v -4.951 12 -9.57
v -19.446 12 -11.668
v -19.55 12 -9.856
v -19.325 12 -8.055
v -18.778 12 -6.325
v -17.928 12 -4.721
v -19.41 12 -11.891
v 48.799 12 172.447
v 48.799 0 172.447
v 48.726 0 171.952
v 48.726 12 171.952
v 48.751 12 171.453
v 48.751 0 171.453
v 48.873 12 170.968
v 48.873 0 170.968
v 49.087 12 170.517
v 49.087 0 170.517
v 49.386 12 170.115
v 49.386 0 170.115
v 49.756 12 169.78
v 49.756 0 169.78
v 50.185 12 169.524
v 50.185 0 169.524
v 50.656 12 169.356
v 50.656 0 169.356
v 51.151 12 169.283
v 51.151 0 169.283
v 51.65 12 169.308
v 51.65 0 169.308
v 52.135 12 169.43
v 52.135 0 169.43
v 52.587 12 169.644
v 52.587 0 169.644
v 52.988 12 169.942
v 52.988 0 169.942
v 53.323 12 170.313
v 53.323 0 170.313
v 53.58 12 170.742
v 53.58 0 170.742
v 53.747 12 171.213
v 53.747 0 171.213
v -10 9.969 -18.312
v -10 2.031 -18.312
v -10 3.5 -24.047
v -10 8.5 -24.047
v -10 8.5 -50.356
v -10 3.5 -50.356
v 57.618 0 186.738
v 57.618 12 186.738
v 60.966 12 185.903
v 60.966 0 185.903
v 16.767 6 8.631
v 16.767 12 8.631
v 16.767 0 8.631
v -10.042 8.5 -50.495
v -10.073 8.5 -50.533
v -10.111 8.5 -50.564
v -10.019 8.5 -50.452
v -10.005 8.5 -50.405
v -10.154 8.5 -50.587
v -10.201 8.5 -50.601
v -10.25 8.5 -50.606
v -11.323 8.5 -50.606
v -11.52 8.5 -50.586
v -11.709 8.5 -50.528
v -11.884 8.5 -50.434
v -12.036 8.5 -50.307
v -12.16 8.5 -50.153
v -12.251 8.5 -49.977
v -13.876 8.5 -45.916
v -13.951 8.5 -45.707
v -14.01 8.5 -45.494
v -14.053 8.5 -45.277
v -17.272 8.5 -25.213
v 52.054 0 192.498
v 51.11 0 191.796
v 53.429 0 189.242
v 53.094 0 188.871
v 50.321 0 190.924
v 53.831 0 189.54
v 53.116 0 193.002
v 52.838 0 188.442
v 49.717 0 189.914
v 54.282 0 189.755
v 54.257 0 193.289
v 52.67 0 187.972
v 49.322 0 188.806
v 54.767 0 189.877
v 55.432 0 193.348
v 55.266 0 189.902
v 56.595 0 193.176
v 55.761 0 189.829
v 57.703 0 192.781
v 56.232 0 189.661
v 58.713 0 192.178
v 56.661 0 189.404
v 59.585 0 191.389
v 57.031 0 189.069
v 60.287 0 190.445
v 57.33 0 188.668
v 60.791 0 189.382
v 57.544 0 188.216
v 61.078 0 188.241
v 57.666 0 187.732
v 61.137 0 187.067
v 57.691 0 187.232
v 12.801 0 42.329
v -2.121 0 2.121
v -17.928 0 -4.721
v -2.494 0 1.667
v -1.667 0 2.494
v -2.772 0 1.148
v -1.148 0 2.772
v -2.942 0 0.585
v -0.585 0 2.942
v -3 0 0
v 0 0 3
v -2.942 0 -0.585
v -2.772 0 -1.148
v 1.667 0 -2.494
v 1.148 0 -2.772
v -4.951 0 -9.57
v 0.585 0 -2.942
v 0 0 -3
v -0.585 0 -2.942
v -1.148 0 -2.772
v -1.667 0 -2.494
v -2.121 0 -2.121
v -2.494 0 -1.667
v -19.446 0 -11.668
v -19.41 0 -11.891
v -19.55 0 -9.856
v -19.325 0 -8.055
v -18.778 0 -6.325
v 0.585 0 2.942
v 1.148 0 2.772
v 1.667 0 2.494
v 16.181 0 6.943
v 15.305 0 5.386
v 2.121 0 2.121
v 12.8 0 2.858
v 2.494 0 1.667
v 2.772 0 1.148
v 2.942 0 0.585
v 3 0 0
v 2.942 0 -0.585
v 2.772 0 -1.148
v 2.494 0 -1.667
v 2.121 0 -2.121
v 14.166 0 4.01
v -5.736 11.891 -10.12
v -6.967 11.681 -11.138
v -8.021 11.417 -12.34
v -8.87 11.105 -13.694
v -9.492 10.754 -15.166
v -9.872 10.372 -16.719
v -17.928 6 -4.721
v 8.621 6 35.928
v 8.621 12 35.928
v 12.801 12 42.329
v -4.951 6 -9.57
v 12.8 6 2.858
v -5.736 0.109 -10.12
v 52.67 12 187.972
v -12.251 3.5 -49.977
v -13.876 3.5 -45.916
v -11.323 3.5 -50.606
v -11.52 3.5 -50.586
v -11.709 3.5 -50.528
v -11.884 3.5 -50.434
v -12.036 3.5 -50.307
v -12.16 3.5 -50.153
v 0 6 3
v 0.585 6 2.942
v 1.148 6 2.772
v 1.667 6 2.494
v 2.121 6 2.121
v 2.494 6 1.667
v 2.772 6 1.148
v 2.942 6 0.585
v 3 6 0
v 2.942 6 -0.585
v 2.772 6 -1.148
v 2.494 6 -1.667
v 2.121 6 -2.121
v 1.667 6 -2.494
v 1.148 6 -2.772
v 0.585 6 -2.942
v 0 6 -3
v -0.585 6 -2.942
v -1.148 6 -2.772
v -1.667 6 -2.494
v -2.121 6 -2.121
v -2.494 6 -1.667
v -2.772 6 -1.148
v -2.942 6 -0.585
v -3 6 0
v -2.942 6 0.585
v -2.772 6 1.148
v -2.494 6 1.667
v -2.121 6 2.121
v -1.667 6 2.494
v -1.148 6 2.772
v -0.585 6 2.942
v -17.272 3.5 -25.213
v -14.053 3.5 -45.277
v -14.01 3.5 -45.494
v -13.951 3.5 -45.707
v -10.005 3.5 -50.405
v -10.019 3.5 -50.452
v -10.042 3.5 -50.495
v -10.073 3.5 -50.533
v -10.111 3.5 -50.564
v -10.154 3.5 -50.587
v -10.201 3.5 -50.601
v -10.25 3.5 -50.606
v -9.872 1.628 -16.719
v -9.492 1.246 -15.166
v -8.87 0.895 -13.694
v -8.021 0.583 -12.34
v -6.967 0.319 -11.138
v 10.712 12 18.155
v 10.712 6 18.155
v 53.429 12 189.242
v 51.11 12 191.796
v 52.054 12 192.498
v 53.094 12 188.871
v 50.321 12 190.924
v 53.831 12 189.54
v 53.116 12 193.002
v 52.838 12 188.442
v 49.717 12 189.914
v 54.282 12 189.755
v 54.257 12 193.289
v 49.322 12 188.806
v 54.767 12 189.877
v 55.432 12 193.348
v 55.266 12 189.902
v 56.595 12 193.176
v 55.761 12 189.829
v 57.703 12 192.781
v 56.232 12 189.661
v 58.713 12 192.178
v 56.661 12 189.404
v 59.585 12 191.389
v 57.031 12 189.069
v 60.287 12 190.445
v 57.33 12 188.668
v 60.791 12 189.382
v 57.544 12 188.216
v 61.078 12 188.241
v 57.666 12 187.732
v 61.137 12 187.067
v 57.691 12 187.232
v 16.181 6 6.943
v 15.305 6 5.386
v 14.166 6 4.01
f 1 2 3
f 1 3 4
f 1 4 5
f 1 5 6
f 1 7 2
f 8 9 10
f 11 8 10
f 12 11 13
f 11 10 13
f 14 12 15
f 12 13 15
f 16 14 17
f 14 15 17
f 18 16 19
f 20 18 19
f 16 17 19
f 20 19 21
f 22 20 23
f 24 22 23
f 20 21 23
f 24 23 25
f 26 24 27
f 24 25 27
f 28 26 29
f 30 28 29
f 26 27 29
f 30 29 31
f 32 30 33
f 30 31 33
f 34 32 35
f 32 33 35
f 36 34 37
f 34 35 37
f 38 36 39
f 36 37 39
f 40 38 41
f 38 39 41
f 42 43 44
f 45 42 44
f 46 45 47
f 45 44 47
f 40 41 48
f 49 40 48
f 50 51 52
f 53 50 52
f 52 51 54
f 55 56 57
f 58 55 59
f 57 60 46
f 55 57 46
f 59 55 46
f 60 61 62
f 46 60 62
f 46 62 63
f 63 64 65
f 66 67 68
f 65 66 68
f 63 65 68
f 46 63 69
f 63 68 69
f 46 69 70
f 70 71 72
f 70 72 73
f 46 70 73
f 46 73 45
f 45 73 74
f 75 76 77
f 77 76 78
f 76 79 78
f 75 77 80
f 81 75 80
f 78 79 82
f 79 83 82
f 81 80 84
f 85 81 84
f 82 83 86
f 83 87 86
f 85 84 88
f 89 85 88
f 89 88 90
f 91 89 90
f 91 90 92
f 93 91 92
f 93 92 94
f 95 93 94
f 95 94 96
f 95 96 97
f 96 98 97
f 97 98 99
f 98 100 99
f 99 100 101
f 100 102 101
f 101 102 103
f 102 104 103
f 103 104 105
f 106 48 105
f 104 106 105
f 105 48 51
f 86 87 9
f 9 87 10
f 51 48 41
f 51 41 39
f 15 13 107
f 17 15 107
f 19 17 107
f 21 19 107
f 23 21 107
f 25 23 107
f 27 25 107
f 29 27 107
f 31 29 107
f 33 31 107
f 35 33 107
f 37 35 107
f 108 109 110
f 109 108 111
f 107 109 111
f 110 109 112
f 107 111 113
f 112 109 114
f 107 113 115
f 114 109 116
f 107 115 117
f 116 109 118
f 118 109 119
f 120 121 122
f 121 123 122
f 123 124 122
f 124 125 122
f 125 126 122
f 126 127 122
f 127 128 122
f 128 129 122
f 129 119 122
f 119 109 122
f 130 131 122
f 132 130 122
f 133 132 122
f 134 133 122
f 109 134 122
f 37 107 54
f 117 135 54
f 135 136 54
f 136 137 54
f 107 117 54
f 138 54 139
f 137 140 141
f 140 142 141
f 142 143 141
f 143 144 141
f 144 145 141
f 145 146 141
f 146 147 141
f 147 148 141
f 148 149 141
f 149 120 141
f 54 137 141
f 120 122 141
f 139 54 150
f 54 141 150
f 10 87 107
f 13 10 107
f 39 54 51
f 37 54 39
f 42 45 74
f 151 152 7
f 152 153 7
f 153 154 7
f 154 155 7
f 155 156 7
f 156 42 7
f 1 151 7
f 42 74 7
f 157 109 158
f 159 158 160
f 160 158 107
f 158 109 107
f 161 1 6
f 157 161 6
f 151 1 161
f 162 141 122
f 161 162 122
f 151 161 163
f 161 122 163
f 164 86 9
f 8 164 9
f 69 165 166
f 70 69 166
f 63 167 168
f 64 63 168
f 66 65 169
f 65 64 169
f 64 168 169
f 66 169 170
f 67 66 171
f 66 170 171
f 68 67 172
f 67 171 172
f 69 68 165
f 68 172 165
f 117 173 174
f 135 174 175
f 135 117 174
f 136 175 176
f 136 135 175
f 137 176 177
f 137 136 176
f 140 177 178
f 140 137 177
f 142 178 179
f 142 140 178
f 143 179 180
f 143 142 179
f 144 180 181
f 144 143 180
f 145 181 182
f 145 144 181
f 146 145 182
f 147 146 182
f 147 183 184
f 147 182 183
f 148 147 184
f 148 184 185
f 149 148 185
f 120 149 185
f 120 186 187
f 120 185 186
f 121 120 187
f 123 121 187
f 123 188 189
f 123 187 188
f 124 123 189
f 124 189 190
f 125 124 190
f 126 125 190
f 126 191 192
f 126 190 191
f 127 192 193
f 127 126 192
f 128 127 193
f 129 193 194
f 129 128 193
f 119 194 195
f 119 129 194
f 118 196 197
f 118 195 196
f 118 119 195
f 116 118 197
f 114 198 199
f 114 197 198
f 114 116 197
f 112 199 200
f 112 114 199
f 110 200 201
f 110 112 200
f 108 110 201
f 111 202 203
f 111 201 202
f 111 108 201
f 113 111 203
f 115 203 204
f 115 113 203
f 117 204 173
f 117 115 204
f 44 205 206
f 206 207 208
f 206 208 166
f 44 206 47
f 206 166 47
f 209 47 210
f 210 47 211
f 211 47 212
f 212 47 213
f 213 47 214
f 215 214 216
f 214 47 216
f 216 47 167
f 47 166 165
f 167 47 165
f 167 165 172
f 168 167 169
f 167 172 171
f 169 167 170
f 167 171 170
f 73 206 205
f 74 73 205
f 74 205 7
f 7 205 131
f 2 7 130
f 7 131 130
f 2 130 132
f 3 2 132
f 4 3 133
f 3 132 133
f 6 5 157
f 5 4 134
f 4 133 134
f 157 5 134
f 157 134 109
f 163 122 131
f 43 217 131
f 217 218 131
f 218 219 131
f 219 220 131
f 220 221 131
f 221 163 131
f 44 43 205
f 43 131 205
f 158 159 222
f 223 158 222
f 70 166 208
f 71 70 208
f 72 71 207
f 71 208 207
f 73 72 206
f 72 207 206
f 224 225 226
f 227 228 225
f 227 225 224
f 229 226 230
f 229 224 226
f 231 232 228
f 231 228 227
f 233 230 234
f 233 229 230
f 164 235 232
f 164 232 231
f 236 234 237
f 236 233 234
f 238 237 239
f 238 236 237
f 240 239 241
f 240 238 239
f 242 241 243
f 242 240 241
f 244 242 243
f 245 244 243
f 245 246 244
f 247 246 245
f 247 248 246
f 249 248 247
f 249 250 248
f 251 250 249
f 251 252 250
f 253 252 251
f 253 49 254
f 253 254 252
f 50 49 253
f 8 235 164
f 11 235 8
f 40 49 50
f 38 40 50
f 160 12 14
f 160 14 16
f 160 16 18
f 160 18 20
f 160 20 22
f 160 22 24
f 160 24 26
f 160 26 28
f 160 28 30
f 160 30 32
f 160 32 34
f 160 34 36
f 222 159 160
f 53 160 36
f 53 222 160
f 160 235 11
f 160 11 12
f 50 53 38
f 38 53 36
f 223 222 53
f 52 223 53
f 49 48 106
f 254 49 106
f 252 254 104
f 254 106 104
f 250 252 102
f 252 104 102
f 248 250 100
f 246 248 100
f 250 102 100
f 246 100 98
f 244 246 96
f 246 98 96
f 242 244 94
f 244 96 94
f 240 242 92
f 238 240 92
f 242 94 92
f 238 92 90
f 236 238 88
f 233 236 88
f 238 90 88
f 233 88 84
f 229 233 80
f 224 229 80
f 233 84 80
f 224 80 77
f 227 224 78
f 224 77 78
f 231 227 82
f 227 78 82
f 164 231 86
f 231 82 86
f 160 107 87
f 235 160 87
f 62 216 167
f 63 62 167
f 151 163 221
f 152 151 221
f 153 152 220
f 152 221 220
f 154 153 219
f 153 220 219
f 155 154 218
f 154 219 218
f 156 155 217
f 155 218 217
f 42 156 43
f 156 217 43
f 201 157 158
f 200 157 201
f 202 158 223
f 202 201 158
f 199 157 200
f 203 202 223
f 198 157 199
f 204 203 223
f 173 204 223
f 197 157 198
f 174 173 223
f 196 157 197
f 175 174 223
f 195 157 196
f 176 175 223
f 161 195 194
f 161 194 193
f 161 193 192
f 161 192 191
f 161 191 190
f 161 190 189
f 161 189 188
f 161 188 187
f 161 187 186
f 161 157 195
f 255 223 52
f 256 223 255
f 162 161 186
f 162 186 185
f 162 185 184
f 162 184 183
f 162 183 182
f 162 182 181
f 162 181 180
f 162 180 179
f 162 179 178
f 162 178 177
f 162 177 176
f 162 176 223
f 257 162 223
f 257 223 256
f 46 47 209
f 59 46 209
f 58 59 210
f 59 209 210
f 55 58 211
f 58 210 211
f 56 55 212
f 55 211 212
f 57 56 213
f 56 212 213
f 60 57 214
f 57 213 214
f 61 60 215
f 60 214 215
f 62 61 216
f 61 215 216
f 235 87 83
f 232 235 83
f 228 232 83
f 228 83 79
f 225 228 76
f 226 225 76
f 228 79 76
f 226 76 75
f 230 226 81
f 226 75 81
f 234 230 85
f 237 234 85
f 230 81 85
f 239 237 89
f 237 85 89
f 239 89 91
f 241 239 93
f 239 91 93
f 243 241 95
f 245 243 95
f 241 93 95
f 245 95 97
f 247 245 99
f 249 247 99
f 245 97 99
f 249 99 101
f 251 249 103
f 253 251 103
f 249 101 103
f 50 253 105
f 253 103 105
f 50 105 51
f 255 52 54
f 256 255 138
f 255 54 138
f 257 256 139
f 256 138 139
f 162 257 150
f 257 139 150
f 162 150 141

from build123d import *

# Parameters (mm, degrees)
SKETCH1_R           = 3
BOSS_EXTRUDE2_DEPTH = 12
SKETCH3_W           = 14.680148962
SKETCH3_H           = 3.5
CUT_EXTRUDE1_DEPTH  = 214.215717845
CUT_EXTRUDE4_DEPTH  = 6


with BuildPart() as part:
    # Sketch1 → Boss-Extrude2 (new body)
    with BuildSketch(Plane(origin=(0, 0, 0), x_dir=(1, 0, 0), z_dir=(0, 1, 0))):
        with BuildLine():
            ThreePointArc((49.32216584, -188.806160656), (56.59547157, -193.17640364), (60.965714553, -185.903097909))
            Line((60.965714554, -185.903097909), (16.76676248, -8.63078365))
            ThreePointArc((16.76676248, -8.63078365), (15.305067103, -5.385940236), (12.79956958, -2.858482163))
            Line((12.79956958, -2.858482163), (-5.735764363, 10.120098388))
            ThreePointArc((-5.735764363, 10.120098388), (-8.870108332, 13.694132698), (-10, 18.311618831))
            Line((-10, 18.311618831), (-10, 50.355948326))
            ThreePointArc((-10, 50.355948326), (-10.073223305, 50.532725021), (-10.25, 50.605948326))
            Line((-10.25, 50.605948326), (-11.322967039, 50.605948326))
            ThreePointArc((-11.322967039, 50.605948326), (-11.883595848, 50.434015556), (-12.251443729, 49.977339002))
            Line((-12.251443729, 49.977339002), (-13.876153382, 45.915564871))
            ThreePointArc((-13.876153382, 45.915564871), (-13.982191925, 45.601023533), (-14.052832331, 45.276692901))
            Line((-14.052832331, 45.276692901), (-19.445744306, 11.667622342))
            ThreePointArc((-19.445744306, 11.667622342), (-19.325125521, 8.055028023), (-17.928078586, 4.721314409))
            Line((-17.928078586, 4.721314409), (12.801336755, -42.329115693))
            Line((12.801336755, -42.329115693), (49.322165839, -188.806160656))
        make_face()
        with BuildLine():
            Line((53.747443969, -171.212996829), (57.618194299, -186.737728449))
            ThreePointArc((57.618194299, -186.737728449), (55.76084103, -189.828883385), (52.669686095, -187.971530117))
            Line((52.669686095, -187.971530117), (48.798935765, -172.446798496))
            ThreePointArc((48.798935765, -172.446798496), (50.656289033, -169.355643561), (53.747443969, -171.212996829))
        make_face(mode=Mode.SUBTRACT)
        with Locations(Location((0, 0, 0), (0, 0, 270))):
            Circle(SKETCH1_R, mode=Mode.SUBTRACT)
    extrude(amount=BOSS_EXTRUDE2_DEPTH)

    # Sketch3 → Cut-Extrude1 (cut, through all)
    with BuildSketch(Plane(origin=(-20.818600927, 0, -3.11186707), x_dir=(-0.15843335293481708, 0, 0.9873696737685596), z_dir=(-0.9873696737685597, 0, -0.1584333529348171))):
        Polygon((-42.704193729, 0), (-8.890997144, 0), (-22.384342691, 3.5), (-42.704193729, 3.5), align=None)
        Polygon((-22.384342691, 8.5), (-8.890997144, 12), (-42.704193729, 12), (-42.704193729, 8.5), align=None)
        with Locations((-50.04426821, 10.25)):
            Rectangle(SKETCH3_W, SKETCH3_H)
        with Locations((-50.04426821, 1.75)):
            Rectangle(SKETCH3_W, SKETCH3_H)
    extrude(amount=-CUT_EXTRUDE1_DEPTH, mode=Mode.SUBTRACT)

    # Sketch4 → Cut-Extrude4 (cut)
    with BuildSketch(Plane(origin=(0, 12, 0), x_dir=(1, 0, 0), z_dir=(0, 1, 0))):
        Polygon((-4.95077941, 9.570446006), (-17.928078586, 4.721314409), (8.620757021, -35.928145405), (10.712205441, -18.154940656), (16.76676248, -8.63078365), (17.432158169, -2.976226879), align=None)
    extrude(amount=-CUT_EXTRUDE4_DEPTH, mode=Mode.SUBTRACT)


solid = part.part
